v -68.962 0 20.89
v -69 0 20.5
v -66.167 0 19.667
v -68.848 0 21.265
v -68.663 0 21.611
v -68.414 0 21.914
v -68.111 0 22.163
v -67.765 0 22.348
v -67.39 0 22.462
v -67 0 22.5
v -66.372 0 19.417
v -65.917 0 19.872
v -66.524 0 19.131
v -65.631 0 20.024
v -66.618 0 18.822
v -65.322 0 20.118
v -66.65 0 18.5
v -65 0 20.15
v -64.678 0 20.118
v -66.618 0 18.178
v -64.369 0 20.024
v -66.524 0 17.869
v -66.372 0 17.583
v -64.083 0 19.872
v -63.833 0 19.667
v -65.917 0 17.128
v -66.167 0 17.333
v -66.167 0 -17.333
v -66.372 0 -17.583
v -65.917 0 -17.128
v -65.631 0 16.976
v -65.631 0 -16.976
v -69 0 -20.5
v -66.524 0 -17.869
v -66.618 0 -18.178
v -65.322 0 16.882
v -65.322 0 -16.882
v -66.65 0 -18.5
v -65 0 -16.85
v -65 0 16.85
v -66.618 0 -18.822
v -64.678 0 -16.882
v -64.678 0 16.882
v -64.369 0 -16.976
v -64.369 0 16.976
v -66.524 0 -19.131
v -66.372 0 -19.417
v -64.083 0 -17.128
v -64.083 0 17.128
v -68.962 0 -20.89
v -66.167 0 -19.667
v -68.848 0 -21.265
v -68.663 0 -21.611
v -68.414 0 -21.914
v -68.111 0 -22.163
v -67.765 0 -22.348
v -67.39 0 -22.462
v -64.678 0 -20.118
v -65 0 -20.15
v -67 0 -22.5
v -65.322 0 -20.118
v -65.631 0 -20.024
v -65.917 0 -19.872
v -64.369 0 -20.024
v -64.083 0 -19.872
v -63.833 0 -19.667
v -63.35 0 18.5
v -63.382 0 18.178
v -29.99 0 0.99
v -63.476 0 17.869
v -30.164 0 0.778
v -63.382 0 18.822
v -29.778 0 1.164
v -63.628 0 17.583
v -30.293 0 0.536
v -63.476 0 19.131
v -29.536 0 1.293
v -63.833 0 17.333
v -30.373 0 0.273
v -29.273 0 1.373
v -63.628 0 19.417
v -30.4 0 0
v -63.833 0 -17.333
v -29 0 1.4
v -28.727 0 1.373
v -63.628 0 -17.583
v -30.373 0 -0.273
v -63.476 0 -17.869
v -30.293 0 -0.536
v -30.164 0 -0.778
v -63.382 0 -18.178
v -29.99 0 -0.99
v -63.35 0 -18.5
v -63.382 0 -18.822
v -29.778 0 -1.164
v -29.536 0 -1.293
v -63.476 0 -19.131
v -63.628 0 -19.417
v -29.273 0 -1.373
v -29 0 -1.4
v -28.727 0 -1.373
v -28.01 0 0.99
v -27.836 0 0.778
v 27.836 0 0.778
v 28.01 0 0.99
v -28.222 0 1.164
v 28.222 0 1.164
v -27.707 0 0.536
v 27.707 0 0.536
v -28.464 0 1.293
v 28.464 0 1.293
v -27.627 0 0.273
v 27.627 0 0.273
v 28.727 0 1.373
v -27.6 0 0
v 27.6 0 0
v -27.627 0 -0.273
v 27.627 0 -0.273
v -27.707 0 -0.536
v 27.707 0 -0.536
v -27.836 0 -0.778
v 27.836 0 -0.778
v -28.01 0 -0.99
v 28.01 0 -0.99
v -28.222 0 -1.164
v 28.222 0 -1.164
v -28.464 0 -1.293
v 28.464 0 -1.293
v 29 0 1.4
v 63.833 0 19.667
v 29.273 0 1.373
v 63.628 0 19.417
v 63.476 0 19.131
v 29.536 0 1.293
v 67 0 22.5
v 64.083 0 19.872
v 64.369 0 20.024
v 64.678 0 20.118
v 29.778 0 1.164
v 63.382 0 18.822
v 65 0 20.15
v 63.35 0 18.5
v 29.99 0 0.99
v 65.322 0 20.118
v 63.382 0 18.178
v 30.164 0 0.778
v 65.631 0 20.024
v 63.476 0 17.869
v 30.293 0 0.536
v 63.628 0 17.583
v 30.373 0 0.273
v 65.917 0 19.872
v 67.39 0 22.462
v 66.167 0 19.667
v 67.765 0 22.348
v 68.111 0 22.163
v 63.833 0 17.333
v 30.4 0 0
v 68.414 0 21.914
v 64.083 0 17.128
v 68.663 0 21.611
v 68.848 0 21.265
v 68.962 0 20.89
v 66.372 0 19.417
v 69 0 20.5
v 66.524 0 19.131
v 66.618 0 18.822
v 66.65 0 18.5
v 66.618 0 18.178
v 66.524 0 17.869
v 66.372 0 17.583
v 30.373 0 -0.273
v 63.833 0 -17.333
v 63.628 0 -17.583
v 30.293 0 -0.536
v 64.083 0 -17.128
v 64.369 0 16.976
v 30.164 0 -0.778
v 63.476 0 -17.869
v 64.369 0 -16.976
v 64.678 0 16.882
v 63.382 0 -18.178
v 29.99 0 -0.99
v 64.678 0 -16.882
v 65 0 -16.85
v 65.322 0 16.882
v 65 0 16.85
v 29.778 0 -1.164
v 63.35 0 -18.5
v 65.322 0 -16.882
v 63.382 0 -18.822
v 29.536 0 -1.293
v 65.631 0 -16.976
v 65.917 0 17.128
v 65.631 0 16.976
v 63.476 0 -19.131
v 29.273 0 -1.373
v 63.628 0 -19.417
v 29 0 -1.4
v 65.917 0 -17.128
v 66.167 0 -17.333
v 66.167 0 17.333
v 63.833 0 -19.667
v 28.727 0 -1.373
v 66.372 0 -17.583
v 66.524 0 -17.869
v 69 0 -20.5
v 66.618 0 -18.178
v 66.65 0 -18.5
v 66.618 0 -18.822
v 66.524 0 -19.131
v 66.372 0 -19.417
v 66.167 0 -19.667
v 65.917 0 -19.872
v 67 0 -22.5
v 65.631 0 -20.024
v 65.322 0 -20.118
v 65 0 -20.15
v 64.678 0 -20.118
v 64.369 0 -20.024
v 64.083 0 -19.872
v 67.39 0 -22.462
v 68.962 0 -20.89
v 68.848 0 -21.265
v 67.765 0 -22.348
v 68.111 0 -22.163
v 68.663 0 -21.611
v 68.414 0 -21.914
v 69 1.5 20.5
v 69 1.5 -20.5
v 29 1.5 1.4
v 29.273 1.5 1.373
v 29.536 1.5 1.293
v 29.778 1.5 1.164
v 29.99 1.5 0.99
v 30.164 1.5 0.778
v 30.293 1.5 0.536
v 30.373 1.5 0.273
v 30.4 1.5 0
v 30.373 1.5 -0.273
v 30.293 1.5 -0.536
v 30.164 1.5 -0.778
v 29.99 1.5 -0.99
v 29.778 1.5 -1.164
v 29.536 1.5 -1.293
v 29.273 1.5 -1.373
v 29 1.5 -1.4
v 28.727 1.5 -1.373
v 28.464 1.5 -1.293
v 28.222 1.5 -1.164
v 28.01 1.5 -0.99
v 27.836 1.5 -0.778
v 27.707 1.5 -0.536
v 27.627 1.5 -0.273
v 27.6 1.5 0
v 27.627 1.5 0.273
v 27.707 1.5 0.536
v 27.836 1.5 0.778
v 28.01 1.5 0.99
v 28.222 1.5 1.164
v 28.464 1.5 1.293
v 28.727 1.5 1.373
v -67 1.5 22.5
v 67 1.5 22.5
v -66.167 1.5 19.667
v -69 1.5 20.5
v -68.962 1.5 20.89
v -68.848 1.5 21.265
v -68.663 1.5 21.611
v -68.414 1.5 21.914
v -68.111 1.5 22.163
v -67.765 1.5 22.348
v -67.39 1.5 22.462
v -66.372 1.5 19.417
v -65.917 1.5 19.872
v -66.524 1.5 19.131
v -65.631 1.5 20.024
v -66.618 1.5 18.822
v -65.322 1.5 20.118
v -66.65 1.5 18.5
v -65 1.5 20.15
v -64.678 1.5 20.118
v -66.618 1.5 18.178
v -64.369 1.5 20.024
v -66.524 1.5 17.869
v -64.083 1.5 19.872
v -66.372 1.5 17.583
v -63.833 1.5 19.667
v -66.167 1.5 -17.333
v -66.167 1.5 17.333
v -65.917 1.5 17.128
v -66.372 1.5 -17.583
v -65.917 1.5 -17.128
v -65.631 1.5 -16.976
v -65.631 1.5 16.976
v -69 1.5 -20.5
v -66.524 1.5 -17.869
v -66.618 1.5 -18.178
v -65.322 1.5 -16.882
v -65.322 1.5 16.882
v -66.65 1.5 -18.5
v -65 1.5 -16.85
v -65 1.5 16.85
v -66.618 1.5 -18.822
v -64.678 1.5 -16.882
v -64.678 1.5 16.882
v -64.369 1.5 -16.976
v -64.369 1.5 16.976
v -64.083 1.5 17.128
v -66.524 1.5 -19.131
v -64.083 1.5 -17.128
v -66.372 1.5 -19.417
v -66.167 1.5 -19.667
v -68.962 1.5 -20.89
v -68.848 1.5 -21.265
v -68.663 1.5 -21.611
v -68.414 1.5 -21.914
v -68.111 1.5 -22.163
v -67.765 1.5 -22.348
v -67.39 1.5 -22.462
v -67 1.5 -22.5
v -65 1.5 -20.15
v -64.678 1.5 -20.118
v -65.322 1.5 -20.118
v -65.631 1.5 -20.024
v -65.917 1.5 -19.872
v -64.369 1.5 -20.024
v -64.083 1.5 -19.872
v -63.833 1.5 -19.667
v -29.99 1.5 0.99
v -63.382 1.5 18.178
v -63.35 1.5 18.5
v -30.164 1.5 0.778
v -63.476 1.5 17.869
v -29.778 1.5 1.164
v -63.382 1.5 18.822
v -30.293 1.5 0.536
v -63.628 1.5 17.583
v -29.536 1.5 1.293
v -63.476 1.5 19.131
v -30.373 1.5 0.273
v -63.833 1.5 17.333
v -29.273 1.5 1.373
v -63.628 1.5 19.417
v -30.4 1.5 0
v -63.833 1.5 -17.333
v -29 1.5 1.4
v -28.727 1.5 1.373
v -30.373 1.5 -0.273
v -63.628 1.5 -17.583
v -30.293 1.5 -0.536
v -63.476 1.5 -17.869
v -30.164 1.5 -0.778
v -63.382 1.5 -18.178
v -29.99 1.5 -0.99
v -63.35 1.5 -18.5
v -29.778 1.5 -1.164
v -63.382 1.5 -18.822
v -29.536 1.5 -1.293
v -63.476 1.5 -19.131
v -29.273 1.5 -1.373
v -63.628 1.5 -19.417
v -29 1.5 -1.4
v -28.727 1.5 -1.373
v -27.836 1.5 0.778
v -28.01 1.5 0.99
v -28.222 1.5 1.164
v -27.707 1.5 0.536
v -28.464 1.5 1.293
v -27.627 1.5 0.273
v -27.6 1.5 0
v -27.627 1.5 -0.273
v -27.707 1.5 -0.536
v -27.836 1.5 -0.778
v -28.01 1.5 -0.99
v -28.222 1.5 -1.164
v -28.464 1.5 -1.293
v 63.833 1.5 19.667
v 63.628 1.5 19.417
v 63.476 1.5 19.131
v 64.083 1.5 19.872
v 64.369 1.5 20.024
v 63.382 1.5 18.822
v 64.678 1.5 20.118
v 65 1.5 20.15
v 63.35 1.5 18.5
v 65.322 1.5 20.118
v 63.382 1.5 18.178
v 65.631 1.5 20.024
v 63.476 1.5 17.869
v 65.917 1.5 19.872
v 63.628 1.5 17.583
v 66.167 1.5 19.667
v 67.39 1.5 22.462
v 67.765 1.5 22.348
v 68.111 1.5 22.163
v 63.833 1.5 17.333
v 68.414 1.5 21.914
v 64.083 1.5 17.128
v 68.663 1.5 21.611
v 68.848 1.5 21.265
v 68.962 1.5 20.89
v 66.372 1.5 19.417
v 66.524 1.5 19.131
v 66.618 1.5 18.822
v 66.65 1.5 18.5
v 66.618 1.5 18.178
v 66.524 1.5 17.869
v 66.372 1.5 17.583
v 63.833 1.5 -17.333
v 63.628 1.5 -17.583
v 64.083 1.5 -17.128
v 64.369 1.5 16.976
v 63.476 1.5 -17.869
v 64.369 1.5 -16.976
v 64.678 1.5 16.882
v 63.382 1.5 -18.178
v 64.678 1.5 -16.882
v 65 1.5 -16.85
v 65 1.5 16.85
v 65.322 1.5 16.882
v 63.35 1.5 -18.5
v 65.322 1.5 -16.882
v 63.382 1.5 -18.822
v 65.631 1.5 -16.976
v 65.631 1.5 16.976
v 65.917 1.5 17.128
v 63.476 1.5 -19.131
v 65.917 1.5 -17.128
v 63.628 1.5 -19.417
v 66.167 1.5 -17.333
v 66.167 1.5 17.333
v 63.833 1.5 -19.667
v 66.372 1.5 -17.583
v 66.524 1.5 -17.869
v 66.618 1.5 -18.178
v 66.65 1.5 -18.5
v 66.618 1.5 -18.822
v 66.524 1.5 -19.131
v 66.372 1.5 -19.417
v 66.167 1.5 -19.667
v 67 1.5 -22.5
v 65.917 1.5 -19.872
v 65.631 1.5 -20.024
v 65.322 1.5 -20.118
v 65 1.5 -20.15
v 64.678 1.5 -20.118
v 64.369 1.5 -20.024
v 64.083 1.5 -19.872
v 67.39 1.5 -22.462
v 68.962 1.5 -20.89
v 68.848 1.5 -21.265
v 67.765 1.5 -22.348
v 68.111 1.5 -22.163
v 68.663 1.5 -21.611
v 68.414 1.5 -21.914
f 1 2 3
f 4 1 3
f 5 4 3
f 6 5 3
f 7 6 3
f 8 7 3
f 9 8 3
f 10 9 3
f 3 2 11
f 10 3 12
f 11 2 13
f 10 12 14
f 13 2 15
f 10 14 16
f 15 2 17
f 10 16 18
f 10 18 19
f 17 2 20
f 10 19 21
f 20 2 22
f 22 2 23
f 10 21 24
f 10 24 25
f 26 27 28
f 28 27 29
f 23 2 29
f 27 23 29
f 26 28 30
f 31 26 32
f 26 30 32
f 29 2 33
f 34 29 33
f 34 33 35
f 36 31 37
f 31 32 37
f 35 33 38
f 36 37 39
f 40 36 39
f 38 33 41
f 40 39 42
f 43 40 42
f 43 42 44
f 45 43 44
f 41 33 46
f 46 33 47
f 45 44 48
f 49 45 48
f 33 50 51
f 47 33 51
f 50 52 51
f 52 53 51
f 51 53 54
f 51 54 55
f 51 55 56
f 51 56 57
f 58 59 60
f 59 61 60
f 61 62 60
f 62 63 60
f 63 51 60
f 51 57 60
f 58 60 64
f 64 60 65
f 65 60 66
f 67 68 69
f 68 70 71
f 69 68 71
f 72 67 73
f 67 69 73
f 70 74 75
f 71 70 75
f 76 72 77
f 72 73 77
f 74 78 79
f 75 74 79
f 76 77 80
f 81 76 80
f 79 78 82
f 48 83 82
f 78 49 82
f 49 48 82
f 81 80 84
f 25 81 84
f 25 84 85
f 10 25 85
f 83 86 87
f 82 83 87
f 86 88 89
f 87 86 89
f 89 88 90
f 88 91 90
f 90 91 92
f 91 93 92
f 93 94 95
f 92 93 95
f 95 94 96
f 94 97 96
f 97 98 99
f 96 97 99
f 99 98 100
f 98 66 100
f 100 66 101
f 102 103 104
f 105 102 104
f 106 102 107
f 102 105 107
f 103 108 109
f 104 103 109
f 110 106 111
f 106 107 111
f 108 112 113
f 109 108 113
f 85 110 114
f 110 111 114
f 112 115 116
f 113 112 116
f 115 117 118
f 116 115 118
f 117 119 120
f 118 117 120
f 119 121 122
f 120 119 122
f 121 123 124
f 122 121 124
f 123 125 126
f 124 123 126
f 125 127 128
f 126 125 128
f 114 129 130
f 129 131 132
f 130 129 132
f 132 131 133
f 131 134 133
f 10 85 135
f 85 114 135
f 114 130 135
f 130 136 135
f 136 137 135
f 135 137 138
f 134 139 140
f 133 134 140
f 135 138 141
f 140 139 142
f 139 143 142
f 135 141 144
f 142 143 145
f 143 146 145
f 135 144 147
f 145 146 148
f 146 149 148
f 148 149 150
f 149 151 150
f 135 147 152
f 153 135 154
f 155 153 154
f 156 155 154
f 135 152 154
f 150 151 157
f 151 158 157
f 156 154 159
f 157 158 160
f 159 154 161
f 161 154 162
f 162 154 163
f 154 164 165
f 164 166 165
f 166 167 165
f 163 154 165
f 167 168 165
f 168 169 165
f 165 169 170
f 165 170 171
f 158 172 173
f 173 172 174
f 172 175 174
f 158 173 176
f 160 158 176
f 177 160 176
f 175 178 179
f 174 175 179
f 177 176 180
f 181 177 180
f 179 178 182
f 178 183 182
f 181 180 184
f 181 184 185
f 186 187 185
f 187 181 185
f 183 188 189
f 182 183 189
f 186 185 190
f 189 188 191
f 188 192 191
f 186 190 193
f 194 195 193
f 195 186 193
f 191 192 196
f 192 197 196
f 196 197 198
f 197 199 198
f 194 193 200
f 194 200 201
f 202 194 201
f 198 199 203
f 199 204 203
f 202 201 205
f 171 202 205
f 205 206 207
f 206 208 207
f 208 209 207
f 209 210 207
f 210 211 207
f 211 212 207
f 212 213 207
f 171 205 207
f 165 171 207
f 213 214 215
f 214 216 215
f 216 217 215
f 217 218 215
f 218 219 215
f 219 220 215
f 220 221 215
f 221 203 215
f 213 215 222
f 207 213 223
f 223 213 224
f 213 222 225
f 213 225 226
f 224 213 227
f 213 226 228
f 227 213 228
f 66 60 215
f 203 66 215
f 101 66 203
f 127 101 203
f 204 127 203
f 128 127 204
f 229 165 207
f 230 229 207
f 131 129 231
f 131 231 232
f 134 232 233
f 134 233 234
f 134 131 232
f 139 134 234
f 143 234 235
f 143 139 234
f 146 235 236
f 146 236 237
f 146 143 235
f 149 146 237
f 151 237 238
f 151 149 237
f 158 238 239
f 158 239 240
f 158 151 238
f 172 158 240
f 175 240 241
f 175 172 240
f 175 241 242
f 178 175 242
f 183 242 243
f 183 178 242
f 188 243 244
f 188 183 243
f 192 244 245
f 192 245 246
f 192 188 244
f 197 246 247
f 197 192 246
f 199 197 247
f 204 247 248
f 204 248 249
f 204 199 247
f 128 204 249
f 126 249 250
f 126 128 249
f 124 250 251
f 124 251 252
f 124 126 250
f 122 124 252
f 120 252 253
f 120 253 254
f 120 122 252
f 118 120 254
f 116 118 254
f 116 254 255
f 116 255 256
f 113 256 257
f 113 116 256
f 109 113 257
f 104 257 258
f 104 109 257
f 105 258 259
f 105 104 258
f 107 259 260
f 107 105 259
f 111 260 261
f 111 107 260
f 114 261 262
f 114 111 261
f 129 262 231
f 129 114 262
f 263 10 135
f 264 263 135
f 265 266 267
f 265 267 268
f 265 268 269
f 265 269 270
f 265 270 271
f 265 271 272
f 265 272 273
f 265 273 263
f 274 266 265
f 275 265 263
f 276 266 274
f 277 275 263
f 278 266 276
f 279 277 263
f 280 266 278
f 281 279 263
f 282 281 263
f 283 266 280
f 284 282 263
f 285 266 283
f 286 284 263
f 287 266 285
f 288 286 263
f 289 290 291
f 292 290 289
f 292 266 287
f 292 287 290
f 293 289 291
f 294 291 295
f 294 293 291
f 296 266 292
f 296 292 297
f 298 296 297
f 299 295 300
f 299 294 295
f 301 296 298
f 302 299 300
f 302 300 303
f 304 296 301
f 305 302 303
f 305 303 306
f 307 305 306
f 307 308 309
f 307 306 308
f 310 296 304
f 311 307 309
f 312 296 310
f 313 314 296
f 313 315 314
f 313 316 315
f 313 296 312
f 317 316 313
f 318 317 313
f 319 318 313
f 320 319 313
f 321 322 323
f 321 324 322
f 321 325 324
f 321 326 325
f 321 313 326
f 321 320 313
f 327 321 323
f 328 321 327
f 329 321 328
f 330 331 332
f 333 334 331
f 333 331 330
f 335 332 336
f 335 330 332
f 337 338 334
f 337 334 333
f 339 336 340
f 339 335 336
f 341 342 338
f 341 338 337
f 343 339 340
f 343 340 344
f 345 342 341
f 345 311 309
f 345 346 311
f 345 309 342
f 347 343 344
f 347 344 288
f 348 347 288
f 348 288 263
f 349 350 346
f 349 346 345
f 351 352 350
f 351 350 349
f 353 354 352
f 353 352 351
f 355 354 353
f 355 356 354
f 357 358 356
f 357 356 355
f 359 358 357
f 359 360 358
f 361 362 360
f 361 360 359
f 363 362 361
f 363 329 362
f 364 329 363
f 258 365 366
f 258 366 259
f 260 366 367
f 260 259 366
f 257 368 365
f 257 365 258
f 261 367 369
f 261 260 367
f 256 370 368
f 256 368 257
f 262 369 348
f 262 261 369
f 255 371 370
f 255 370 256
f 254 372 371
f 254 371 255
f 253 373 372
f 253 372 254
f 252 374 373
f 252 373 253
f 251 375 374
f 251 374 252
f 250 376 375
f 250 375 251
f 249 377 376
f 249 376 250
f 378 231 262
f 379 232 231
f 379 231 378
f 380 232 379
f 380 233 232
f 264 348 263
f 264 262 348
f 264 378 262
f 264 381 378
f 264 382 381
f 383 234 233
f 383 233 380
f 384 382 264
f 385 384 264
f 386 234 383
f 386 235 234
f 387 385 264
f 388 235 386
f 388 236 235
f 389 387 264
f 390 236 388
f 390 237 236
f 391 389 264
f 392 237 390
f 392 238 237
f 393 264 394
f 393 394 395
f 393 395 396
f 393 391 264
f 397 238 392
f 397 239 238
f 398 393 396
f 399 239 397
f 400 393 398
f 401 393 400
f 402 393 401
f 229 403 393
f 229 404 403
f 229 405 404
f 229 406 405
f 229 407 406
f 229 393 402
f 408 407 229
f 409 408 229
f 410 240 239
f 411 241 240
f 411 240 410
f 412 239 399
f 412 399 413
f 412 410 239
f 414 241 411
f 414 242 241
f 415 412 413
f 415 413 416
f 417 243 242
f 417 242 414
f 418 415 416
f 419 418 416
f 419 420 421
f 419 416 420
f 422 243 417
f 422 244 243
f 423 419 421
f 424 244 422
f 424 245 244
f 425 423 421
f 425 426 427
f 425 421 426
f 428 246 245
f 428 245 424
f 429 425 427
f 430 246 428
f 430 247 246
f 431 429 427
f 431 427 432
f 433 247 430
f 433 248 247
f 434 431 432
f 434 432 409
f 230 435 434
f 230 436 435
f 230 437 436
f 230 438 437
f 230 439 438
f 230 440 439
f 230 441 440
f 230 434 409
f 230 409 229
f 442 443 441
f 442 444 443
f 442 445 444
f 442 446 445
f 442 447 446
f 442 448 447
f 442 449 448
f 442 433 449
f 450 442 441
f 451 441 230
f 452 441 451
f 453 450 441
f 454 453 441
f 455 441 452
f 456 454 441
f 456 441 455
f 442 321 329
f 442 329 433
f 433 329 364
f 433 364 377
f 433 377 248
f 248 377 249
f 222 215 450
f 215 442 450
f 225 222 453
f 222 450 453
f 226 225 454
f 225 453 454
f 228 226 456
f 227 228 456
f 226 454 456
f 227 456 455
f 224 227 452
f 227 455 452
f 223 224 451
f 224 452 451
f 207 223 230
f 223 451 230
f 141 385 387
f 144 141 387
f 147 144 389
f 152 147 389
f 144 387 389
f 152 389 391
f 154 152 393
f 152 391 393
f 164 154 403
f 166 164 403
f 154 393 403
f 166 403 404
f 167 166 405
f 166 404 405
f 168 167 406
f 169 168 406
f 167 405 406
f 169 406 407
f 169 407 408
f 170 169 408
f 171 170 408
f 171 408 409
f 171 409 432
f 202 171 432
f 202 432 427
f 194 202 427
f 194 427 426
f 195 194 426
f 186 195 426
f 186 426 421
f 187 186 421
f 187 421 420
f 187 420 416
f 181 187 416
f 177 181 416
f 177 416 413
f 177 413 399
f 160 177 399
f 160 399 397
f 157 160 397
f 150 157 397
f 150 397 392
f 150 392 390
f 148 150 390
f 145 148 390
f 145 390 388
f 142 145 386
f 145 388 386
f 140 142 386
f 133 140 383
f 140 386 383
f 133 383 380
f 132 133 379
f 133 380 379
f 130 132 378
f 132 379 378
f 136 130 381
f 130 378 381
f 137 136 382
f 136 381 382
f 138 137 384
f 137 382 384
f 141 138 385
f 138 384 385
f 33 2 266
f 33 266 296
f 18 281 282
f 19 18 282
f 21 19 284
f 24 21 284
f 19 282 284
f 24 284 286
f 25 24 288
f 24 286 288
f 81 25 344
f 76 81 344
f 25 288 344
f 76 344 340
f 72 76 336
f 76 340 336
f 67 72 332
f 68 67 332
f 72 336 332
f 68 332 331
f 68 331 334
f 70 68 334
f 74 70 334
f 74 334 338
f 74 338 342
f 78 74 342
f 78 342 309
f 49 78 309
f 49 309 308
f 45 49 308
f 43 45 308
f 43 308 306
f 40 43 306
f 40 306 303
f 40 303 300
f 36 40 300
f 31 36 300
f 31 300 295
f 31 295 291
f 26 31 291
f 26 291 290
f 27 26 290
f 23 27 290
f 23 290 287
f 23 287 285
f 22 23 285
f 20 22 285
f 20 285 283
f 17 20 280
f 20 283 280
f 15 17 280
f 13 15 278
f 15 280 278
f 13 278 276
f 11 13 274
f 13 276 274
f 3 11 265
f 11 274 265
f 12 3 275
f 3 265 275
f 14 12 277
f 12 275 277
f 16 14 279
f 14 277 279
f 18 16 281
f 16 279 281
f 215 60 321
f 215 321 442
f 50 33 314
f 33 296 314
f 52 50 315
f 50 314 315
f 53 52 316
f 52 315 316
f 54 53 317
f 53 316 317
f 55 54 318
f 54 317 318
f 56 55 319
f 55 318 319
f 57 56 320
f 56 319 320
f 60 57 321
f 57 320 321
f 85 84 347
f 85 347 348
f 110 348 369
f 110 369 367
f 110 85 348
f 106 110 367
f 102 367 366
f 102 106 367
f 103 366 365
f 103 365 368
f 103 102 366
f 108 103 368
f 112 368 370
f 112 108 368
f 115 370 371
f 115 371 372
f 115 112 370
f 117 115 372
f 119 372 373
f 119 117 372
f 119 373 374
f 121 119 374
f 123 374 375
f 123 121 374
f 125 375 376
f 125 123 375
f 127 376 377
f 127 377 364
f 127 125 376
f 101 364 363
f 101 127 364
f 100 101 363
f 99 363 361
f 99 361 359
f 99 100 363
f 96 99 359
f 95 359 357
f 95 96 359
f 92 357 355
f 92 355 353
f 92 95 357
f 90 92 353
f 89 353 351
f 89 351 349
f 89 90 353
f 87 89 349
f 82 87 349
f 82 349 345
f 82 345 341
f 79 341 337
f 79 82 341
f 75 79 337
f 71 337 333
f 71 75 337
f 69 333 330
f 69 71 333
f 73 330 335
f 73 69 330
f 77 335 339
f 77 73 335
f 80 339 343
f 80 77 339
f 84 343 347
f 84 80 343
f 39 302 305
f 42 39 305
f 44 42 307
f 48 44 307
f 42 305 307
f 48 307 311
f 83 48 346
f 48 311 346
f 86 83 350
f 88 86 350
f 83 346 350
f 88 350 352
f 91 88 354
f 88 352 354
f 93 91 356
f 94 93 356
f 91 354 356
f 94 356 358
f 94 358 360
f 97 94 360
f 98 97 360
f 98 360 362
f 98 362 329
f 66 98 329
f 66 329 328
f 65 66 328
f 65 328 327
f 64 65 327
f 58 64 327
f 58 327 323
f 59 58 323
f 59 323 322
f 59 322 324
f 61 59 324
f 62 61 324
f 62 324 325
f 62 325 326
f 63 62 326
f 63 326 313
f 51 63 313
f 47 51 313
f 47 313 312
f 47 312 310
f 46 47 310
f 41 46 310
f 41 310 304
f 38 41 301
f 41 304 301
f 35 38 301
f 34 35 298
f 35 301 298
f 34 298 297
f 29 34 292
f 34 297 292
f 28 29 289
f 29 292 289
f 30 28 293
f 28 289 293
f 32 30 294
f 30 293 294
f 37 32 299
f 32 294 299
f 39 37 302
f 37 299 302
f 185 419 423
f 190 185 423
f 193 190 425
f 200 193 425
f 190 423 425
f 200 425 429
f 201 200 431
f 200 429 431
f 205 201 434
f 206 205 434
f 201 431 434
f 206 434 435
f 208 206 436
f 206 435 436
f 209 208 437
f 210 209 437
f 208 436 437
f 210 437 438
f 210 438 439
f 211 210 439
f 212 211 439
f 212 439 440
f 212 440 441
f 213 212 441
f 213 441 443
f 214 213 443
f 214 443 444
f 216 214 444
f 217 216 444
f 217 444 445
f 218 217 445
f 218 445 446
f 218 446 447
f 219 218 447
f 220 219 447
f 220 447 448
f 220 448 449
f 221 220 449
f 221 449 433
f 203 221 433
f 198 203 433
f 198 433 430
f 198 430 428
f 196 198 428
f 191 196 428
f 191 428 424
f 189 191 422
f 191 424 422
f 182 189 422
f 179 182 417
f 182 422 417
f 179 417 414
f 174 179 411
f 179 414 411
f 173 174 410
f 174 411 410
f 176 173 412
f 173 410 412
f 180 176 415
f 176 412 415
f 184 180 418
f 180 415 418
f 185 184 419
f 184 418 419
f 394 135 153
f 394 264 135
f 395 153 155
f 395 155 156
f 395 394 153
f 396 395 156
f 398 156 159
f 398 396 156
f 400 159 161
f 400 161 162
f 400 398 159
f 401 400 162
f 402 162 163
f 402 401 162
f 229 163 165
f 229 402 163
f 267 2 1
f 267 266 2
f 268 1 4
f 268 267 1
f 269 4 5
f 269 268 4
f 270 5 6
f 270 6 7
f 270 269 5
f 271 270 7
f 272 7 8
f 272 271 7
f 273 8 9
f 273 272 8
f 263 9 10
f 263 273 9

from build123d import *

# Parameters (mm, degrees)
SKETCH1_W           = 138
SKETCH1_H           = 45
SKETCH1_R           = 1.4
BOSS_EXTRUDE1_DEPTH = 1.5
SKETCH2_R           = 1.65
CUT_EXTRUDE1_DEPTH  = 73.591321795
FILLET1_R           = 2


with BuildPart() as part:
    # Sketch1 → Boss-Extrude1 (new body)
    with BuildSketch(Plane(origin=(0, 0, 0), x_dir=(1, 0, 0), z_dir=(0, 1, 0))):
        Rectangle(SKETCH1_W, SKETCH1_H)
        with Locations(Location((-29, 0, 0), (0, 0, 270))):
            Circle(SKETCH1_R, mode=Mode.SUBTRACT)
        with Locations(Location((29, 0, 0), (0, 0, 270))):
            Circle(SKETCH1_R, mode=Mode.SUBTRACT)
    extrude(amount=BOSS_EXTRUDE1_DEPTH)

    # Sketch2 → Cut-Extrude1 (cut, through all)
    with BuildSketch(Plane(origin=(0, 1.5, 0), x_dir=(1, 0, 0), z_dir=(0, 1, 0))):
        with Locations(Location((-65, 18.5, 0), (0, 0, 270))):
            Circle(SKETCH2_R)
        with Locations(Location((-65, -18.5, 0), (0, 0, 270))):
            Circle(SKETCH2_R)
        with Locations(Location((65, 18.5, 0), (0, 0, 270))):
            Circle(SKETCH2_R)
        with Locations(Location((65, -18.5, 0), (0, 0, 270))):
            Circle(SKETCH2_R)
    extrude(amount=-CUT_EXTRUDE1_DEPTH, mode=Mode.SUBTRACT)

    # Fillet1
    fillet1_edges = [part.edges().sort_by_distance(p)[0] for p in [
        (-69, 0.75, -22.5),
        (69, 0.75, -22.5),
        (69, 0.75, 22.5),
        (-69, 0.75, 22.5),
    ]]
    fillet(fillet1_edges, radius=FILLET1_R)


solid = part.part
